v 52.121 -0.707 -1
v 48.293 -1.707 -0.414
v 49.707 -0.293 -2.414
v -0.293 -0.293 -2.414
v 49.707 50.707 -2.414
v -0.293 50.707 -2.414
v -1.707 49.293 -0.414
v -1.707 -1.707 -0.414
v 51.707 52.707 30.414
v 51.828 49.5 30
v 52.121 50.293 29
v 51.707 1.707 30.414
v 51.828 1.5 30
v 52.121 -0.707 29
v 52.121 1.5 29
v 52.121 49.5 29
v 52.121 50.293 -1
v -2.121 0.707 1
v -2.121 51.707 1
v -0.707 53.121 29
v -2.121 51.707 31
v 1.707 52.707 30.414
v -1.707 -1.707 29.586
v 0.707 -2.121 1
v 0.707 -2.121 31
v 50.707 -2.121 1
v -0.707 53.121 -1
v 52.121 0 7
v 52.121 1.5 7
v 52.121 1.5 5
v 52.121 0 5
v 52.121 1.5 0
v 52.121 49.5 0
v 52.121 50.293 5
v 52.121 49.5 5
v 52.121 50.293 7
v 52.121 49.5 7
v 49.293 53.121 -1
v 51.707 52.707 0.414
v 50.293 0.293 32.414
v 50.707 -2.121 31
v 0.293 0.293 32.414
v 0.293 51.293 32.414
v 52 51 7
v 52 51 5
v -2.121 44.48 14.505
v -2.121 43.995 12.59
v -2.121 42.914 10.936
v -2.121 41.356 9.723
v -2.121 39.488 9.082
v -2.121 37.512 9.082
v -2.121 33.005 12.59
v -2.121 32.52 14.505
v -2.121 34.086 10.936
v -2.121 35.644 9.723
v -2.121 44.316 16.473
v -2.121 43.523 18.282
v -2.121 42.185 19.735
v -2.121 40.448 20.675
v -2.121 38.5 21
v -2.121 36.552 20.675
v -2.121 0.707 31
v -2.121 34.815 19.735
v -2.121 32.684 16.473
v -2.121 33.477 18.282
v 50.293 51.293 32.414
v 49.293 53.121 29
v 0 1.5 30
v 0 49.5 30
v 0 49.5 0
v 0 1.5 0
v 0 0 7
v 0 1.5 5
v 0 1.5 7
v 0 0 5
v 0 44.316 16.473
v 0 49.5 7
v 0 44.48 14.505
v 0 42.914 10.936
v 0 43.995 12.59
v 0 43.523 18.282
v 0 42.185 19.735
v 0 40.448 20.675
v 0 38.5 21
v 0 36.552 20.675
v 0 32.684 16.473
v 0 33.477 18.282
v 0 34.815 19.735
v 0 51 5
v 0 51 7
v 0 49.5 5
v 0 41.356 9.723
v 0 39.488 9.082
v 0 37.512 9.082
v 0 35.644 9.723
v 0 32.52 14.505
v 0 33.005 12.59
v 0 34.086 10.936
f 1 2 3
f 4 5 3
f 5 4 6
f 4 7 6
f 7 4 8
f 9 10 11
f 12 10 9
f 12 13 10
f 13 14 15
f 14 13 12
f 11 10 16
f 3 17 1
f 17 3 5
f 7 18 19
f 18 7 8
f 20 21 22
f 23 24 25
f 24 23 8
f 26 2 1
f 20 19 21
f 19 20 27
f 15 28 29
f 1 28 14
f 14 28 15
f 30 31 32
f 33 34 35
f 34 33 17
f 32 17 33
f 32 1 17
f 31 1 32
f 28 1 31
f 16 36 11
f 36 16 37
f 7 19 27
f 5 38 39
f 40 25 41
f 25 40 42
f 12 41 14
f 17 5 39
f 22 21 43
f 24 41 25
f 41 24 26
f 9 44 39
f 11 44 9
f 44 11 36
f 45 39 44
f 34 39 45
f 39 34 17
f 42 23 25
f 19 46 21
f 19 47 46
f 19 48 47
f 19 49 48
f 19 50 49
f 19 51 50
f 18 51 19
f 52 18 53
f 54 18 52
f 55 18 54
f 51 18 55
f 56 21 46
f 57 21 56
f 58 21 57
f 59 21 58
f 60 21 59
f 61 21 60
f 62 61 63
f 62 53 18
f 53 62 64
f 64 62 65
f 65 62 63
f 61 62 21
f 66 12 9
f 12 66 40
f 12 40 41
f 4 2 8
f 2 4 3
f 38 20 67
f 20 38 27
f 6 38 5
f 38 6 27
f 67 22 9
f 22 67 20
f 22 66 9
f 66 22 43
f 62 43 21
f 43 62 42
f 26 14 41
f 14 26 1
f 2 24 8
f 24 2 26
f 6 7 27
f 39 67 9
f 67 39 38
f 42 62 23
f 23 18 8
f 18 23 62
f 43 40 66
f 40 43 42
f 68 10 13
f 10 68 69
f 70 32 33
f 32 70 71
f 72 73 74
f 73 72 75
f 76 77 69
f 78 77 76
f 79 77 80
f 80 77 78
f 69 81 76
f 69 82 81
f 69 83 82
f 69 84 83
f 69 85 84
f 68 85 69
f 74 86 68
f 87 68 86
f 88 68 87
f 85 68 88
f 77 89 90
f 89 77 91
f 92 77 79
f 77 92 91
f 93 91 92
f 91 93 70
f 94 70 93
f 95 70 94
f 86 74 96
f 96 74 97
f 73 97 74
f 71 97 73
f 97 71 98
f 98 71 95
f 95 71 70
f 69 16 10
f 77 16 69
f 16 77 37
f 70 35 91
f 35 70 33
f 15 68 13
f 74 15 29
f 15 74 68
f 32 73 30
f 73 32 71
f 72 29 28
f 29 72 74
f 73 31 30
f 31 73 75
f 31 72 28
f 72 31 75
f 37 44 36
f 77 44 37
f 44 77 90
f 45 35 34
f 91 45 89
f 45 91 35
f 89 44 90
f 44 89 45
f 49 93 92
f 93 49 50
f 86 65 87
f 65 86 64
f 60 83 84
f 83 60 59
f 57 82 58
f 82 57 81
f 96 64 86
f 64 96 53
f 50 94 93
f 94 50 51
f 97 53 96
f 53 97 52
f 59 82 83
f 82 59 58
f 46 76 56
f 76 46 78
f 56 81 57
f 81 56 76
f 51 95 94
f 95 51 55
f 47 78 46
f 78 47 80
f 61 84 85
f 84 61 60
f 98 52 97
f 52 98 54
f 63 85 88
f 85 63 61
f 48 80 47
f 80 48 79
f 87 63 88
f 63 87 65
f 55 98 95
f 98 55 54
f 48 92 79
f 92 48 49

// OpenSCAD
// translate([0, 0.5, pcbO]) import("midiguitarpcb.stl");

w = 50;
d = 51;
h = 30;
r = 2 * sqrt(2);
wedgeW = w + r;
wedgeD = 1.5;
wedgeH = 2;
pcbO = 5;

difference() {
	hull() {
		for (x = [0, w]) {
			for (y = [0, d]) {
				for (z = [0, h]) {
					translate([x, y, z]) rotate([45, 45, 45]) cube(r, true);
				}
			}
		}
	}
	translate([0, wedgeD, 0]) cube([w + r, d - 2 * wedgeD, h]);
	translate([0, 0, pcbO]) cube([wedgeW, wedgeD, wedgeH]);
	translate([0, d - wedgeD, pcbO]) cube([wedgeW, wedgeD, wedgeH]);
	translate([0, d - 12.5, 8 + pcbO + wedgeH]) rotate([0, -90, 0]) cylinder(d = 12, h = r);
}
